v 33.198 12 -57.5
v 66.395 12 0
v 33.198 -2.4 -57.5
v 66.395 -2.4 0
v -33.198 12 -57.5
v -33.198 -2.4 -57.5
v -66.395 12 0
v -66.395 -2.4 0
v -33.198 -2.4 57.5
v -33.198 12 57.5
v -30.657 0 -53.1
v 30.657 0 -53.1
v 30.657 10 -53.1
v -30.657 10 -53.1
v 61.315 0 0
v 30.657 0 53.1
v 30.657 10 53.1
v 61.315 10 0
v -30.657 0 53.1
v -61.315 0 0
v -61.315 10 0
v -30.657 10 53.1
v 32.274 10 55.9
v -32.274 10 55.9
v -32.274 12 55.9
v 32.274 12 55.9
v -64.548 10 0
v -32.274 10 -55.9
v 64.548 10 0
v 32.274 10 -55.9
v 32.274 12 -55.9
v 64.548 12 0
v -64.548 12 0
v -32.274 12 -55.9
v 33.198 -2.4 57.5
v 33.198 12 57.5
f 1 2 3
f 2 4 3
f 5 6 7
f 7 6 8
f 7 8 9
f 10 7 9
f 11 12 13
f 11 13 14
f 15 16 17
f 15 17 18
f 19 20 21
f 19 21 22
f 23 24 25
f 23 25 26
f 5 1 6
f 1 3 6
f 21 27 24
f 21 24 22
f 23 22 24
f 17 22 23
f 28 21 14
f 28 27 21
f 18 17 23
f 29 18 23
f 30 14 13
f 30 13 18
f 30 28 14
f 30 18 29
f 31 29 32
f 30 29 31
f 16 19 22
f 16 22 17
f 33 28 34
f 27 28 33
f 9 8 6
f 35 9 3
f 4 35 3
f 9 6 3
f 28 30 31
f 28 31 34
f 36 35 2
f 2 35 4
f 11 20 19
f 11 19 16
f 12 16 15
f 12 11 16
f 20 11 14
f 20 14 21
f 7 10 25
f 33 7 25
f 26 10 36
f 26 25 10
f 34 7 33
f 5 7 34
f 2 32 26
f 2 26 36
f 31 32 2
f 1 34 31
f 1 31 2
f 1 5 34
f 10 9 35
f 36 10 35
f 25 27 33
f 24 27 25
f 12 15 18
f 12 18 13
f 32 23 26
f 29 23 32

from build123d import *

# Parameters (mm, degrees)
BOSS_EXTRUDE1_DEPTH = 2.4
BOSS_EXTRUDE2_DEPTH = 10
BOSS_EXTRUDE3_DEPTH = 12


with BuildPart() as part:
    # Sketch1 → Boss-Extrude1 (new body)
    with BuildSketch(Plane(origin=(0, 0, 0), x_dir=(1, 0, 0), z_dir=(0, 1, 0))):
        Polygon((66.395280957, 0), (33.197640478, 57.5), (-33.197640478, 57.5), (-66.395280957, 0), (-33.197640478, -57.5), (33.197640478, -57.5), align=None)
    extrude(amount=-BOSS_EXTRUDE1_DEPTH)

    # Sketch1<3> → Boss-Extrude2 (add)
    with BuildSketch(Plane(origin=(0, 0, 0), x_dir=(1, 0, 0), z_dir=(0, 1, 0))):
        Polygon((32.273880048, -55.9), (64.547760095, 0), (32.273880048, 55.9), (-32.273880048, 55.9), (-64.547760095, 0), (-32.273880048, -55.9), align=None)
        Polygon((30.657299294, 53.1), (-30.657299294, 53.1), (-61.314598588, 0), (-30.657299294, -53.1), (30.657299294, -53.1), (61.314598588, 0), align=None, mode=Mode.SUBTRACT)
    extrude(amount=BOSS_EXTRUDE2_DEPTH)

    # Sketch1<4> → Boss-Extrude3 (add)
    with BuildSketch(Plane(origin=(0, 0, 0), x_dir=(1, 0, 0), z_dir=(0, 1, 0))):
        Polygon((-33.197640478, -57.5), (33.197640478, -57.5), (66.395280957, 0), (33.197640478, 57.5), (-33.197640478, 57.5), (-66.395280957, 0), align=None)
        Polygon((64.547760095, 0), (32.273880048, 55.9), (-32.273880048, 55.9), (-64.547760095, 0), (-32.273880048, -55.9), (32.273880048, -55.9), align=None, mode=Mode.SUBTRACT)
    extrude(amount=BOSS_EXTRUDE3_DEPTH)


solid = part.part
